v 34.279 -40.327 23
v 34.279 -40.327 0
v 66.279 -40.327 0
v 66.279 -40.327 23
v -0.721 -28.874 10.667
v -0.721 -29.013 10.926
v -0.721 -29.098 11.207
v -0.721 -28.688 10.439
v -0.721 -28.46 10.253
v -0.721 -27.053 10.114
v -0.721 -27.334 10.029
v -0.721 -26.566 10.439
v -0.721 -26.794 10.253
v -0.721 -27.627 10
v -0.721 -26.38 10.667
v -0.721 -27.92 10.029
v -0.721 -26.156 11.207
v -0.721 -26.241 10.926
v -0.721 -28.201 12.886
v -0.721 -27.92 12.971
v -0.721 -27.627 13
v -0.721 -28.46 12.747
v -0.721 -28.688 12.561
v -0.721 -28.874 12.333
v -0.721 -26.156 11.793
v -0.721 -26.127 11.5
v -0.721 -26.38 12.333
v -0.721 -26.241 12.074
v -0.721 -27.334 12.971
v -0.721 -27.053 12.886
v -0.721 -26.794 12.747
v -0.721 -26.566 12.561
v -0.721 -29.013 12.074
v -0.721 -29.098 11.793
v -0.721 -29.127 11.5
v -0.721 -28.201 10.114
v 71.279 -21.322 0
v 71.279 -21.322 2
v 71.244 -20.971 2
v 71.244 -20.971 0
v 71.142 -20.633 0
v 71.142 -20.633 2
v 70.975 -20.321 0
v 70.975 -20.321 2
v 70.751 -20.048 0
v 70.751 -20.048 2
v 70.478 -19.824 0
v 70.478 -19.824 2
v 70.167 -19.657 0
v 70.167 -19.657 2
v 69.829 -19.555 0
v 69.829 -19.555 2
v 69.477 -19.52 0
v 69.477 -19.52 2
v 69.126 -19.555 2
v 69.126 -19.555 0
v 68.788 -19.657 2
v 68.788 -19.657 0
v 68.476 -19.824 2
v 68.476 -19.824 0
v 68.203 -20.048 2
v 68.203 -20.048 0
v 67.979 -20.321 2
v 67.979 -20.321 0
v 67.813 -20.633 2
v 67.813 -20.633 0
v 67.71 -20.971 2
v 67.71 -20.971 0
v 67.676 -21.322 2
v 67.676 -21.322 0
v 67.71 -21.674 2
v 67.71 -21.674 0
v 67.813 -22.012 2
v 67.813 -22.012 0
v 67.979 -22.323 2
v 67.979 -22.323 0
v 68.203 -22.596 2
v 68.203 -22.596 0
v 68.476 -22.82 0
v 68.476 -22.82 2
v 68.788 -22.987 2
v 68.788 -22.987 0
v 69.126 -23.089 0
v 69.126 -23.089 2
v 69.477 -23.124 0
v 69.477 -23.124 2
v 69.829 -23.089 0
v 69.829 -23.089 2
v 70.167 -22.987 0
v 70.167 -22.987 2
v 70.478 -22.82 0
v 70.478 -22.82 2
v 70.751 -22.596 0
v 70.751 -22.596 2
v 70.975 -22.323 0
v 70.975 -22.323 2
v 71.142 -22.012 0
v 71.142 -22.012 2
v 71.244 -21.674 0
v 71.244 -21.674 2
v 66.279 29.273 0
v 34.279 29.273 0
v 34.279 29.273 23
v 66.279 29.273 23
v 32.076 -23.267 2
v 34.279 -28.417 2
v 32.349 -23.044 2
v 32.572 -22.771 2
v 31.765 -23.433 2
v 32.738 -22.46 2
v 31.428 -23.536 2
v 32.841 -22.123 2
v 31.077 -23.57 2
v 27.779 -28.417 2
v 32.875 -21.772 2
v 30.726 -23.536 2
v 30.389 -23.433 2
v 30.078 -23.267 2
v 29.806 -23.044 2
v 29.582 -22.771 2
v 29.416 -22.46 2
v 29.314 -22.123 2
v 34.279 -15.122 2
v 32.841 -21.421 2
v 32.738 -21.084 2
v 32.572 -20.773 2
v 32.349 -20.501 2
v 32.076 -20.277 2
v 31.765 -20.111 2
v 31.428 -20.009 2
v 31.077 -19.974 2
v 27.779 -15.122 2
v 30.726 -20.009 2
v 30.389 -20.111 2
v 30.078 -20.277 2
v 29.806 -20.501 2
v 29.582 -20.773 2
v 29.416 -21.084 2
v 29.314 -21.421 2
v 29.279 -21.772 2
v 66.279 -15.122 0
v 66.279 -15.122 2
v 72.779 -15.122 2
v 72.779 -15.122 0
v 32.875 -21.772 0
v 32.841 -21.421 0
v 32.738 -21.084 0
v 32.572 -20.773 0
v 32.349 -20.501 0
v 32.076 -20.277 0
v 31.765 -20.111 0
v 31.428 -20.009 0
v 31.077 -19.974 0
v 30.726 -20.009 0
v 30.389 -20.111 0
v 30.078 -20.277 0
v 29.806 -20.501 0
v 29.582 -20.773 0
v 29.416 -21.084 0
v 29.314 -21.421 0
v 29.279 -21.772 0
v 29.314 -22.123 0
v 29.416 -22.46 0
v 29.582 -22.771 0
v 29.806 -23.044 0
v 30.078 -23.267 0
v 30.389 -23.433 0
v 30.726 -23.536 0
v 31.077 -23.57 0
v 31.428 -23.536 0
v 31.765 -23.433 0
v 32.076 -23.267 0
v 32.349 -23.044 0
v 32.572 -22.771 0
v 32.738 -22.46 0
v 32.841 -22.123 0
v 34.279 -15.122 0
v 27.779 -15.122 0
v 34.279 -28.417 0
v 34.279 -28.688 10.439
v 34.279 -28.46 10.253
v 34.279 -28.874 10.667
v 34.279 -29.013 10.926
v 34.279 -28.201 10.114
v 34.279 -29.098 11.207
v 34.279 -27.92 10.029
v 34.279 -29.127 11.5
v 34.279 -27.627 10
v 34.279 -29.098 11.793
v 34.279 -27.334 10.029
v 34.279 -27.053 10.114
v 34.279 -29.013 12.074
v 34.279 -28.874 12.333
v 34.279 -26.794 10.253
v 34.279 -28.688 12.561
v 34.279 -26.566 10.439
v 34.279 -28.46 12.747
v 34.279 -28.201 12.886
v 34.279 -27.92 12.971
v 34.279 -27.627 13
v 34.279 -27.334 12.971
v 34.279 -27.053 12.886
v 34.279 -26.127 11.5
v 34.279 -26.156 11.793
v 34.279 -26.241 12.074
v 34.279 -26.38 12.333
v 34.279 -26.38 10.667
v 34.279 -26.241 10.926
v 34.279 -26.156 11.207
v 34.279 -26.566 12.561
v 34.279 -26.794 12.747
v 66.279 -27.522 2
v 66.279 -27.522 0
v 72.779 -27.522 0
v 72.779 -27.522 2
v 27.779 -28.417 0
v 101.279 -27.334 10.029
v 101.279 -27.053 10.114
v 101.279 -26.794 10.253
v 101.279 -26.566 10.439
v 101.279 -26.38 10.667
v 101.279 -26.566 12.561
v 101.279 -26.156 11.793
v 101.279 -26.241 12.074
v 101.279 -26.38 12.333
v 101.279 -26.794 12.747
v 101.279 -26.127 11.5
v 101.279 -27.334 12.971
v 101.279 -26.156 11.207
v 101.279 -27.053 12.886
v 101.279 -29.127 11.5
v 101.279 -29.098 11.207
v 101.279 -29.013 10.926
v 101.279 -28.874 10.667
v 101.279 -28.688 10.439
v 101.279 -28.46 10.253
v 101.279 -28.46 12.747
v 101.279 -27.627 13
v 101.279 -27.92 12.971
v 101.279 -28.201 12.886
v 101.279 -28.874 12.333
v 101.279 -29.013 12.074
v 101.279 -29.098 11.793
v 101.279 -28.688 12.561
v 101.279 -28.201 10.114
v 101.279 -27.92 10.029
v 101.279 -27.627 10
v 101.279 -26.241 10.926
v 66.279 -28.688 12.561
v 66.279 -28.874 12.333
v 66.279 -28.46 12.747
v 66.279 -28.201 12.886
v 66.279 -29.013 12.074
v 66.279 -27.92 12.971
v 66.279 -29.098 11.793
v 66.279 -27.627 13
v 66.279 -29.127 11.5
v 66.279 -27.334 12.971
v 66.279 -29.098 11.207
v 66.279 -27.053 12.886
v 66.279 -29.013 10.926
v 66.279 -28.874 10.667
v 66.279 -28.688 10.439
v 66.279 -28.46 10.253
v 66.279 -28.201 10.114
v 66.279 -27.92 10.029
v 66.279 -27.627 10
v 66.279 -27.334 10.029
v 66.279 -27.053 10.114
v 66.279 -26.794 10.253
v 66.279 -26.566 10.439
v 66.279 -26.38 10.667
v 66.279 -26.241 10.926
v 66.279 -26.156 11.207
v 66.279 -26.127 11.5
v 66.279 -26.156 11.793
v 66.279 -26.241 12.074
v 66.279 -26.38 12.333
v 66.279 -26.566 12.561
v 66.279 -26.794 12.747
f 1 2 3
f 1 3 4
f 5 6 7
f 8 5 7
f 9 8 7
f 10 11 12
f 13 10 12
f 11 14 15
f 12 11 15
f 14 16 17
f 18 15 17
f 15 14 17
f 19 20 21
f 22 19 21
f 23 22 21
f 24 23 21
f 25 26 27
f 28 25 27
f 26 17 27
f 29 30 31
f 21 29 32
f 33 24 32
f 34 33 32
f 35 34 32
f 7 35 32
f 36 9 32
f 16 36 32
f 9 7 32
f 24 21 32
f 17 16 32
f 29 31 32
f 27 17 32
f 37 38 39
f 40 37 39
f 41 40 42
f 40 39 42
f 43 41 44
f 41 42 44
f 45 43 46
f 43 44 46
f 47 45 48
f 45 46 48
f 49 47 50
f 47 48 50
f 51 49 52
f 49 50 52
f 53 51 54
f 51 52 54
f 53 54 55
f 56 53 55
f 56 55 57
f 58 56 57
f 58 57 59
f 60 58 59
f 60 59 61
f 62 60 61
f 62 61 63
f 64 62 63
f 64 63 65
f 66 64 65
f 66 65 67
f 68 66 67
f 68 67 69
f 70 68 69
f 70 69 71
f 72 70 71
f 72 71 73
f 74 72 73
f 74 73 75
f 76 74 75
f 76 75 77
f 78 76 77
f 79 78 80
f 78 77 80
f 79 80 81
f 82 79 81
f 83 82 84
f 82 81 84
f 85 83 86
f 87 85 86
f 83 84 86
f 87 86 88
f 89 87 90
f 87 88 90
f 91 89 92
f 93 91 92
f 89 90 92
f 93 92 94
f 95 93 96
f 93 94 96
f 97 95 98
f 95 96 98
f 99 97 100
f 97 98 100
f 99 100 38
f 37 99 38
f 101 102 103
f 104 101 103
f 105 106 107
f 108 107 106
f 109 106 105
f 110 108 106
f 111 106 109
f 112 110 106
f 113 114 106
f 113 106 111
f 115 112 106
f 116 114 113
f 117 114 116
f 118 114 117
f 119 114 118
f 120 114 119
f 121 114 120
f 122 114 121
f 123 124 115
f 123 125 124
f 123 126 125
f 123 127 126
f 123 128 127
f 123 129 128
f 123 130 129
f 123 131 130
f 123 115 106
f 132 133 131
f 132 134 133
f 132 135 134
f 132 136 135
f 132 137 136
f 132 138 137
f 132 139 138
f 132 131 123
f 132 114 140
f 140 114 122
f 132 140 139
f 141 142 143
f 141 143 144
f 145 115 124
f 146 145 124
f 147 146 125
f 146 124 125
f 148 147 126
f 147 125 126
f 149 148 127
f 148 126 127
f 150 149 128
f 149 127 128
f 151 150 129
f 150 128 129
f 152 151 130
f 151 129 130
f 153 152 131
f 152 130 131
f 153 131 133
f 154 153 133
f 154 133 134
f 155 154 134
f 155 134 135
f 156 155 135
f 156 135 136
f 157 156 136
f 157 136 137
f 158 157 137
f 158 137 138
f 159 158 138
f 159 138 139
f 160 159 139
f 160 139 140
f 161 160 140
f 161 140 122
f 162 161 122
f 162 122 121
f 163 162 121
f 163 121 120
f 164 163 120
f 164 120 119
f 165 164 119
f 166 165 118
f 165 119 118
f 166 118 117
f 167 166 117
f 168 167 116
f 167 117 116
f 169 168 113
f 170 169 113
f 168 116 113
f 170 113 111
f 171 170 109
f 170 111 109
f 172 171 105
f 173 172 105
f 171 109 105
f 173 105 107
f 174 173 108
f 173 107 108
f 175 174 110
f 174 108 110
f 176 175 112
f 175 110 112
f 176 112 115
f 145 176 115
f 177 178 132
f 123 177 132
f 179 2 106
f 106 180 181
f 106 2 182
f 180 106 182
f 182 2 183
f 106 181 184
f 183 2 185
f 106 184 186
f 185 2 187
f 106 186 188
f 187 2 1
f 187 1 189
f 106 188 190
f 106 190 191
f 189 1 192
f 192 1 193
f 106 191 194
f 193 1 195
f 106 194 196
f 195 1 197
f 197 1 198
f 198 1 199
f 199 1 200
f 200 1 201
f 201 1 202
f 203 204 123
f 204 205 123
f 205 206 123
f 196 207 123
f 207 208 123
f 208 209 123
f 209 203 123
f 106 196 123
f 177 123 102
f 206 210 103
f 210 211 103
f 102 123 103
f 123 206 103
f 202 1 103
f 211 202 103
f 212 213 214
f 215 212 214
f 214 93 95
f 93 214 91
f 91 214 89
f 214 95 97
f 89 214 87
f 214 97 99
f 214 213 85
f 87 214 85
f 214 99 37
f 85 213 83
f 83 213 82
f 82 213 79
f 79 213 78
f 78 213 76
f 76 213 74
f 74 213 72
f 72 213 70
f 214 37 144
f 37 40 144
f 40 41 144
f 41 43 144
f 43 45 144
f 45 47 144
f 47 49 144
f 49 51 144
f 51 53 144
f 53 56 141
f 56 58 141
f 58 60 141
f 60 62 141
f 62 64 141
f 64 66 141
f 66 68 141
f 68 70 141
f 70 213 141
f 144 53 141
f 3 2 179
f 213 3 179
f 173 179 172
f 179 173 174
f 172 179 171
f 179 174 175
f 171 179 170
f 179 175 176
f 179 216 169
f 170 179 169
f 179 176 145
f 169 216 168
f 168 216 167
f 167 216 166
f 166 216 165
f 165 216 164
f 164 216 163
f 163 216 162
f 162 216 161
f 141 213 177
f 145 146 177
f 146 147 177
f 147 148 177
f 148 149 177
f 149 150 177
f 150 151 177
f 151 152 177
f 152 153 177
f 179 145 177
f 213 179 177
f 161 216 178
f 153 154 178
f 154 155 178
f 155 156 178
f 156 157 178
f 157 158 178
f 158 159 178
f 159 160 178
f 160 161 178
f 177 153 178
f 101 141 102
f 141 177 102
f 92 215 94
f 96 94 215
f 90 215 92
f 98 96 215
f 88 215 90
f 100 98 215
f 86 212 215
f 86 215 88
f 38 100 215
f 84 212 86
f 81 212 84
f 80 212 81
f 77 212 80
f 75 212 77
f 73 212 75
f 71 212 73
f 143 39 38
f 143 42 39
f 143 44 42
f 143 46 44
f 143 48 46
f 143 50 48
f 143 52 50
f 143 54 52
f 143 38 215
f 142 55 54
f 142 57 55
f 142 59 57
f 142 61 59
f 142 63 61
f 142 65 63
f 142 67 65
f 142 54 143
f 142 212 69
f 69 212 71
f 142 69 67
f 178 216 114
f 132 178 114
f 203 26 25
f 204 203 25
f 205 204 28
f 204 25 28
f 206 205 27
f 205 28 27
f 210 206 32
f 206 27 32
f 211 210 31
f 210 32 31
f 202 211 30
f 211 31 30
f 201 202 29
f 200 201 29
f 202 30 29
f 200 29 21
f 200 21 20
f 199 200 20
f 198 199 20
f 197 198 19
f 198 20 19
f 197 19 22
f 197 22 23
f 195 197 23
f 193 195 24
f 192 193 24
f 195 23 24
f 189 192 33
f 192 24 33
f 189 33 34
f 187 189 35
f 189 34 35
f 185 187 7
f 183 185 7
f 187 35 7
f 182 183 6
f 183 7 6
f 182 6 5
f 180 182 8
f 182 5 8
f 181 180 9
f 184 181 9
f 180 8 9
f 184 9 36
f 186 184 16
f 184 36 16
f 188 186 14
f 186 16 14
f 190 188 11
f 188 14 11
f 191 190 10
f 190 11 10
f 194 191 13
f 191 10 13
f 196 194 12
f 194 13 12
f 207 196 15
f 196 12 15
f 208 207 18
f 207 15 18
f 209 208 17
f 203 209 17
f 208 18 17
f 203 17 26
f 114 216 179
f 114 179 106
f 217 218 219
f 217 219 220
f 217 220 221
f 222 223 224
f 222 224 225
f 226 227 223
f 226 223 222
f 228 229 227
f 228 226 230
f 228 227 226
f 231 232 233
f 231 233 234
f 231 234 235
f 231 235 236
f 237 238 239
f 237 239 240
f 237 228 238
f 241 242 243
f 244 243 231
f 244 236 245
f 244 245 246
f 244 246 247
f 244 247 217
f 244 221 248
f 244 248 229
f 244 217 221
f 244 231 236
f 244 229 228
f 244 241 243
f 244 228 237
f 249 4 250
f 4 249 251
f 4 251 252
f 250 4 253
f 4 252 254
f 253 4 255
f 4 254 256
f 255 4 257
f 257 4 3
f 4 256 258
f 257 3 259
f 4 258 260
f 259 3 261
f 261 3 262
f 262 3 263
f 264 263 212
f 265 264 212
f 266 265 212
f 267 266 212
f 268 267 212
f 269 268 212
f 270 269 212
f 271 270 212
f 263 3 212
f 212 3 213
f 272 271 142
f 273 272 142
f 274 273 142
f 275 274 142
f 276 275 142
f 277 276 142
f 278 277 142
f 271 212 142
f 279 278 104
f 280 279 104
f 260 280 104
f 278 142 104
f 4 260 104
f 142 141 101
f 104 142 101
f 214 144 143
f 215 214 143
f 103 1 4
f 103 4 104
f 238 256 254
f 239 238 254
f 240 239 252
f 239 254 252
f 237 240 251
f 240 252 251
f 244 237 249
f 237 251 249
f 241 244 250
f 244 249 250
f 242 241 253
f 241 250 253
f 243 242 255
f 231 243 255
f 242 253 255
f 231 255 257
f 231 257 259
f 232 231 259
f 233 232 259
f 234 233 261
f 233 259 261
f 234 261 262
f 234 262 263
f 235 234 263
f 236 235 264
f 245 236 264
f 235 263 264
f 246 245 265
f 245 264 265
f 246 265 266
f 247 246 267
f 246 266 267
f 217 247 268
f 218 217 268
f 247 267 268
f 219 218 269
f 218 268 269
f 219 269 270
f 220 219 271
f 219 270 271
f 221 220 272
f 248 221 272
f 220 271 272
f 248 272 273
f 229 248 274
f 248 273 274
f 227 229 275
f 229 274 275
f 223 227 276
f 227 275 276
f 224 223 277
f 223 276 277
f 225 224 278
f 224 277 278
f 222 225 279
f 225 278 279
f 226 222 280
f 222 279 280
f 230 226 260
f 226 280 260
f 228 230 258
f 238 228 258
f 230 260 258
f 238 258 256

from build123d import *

# Parameters (mm, degrees)
SKETCH_1_W            = 32
SKETCH_1_H            = 69.6
EXTRUDE_1_DEPTH       = 23
SKETCH_2_R            = 1.5
EXTRUDE_2_DEPTH       = 35
SKETCH_3_W            = 2
SKETCH_3_H            = 3.6
EXTRUDE_3_DEPTH       = 4.5
SKETCH_5_W            = 16
SKETCH_5_H            = 23
CUT_EXTRUDE_1_DEPTH   = 71.5
SKETCH_6_W            = 4.5
SKETCH_6_H            = 3.6
CUT_EXTRUDE_2_DEPTH   = 1
SKETCH_7_W            = 2
SKETCH_7_H            = 4.4
EXTRUDE_4_DEPTH       = 6.5
SKETCH_9_W            = 1
SKETCH_9_H            = 1.8
CUT_EXTRUDE_3_DEPTH   = 4.5
MIRROR_4_OUTLINE_W    = 4.5
MIRROR_4_OUTLINE_H    = 1.8
MIRROR_4_DEPTH        = 1
MIRROR_4_2_OUTLINE_W  = 6.5
MIRROR_4_2_OUTLINE_H  = 4.4
MIRROR_4_2_DEPTH      = 2
SKETCH_10_W           = 1.5
SKETCH_10_H           = 2
EXTRUDE_5_DEPTH       = 4.5
MIRROR_START          = 34.279062003
MIRROR_25_OUTLINE_W   = 69.6
MIRROR_25_OUTLINE_H   = 23
MIRROR_25_DEPTH       = 16
MIRROR_START_2        = -0.720937997
MIRROR_25_2_OUTLINE_R = 1.5
MIRROR_25_2_DEPTH     = 35
MIRROR_START_3        = 27.779062003
MIRROR_25_3_OUTLINE_W = 4.4
MIRROR_25_3_OUTLINE_H = 2
MIRROR_25_3_DEPTH     = 6.5
MIRROR_25_4_OUTLINE_W = 4.5
MIRROR_25_4_OUTLINE_H = 2
MIRROR_25_4_DEPTH     = 1.5
SKETCH_12_W           = 2
SKETCH_12_H           = 4.395113111
EXTRUDE_6_DEPTH       = 7.5
SKETCH_15_W           = 2
SKETCH_15_H           = 3.6
EXTRUDE_7_DEPTH       = 6
SKETCH_14_R           = 1.801767182
CUT_EXTRUDE_4_DEPTH   = 6
SKETCH_17_W           = 2
SKETCH_17_H           = 4.5
EXTRUDE_8_DEPTH       = 6
SKETCH_16_R           = 1.798109405
CUT_EXTRUDE_5_DEPTH   = 6


# Read off the part's stored shape, not the designer's step: ﾐﾗｰ4, ﾐﾗｰ25
with BuildPart() as part:
    # ｽｹｯﾁ1 → ﾎﾞｽ - 押し出し1 (new body)
    with BuildSketch(Plane.XY):
        with Locations((50.279062003, -5.527058824)):
            Rectangle(SKETCH_1_W, SKETCH_1_H)
    extrude(amount=EXTRUDE_1_DEPTH)

    # ｽｹｯﾁ2 → ﾎﾞｽ - 押し出し2 (add)
    with BuildSketch(Plane(origin=(66.279062003, 0, 0), x_dir=(0, 0, -1), z_dir=(1, 0, 0))):
        with Locations(Location((-11.5, -27.627058824, 0), (0, 0, 180))):
            Circle(SKETCH_2_R)
    extrude(amount=EXTRUDE_2_DEPTH)

    # ｽｹｯﾁ3 → ﾎﾞｽ - 押し出し3 (add)
    with BuildSketch(Plane(origin=(66.279062003, 0, 0), x_dir=(0, 0, -1), z_dir=(1, 0, 0))):
        with Locations((-1, -21.322089651)):
            Rectangle(SKETCH_3_W, SKETCH_3_H)
    extrude(amount=EXTRUDE_3_DEPTH)

    # ｽｹｯﾁ5 → ｶｯﾄ - 押し出し1 (cut)
    with BuildSketch(Plane(origin=(0, 29.272941176, 0), x_dir=(1, 0, 0), z_dir=(0, 1, 0))):
        with Locations((42.279062003, -11.5)):
            Rectangle(SKETCH_5_W, SKETCH_5_H)
    extrude(amount=-CUT_EXTRUDE_1_DEPTH, mode=Mode.SUBTRACT)

    # ｽｹｯﾁ6 → ｶｯﾄ - 押し出し2 (cut)
    with BuildSketch(Plane.XY.offset(2)):
        with Locations((68.529062003, -21.322089651)):
            Rectangle(SKETCH_6_W, SKETCH_6_H)
    extrude(amount=-CUT_EXTRUDE_2_DEPTH, mode=Mode.SUBTRACT)

    # ｽｹｯﾁ7 → ﾎﾞｽ - 押し出し4 (add)
    with BuildSketch(Plane(origin=(66.279062003, 0, 0), x_dir=(0, 0, -1), z_dir=(1, 0, 0))):
        with Locations((-1, -17.322089651)):
            Rectangle(SKETCH_7_W, SKETCH_7_H)
    extrude(amount=EXTRUDE_4_DEPTH)

    # ｽｹｯﾁ9 → ｶｯﾄ - 押し出し3 (cut)
    with BuildSketch(Plane(origin=(70.779062003, 0, 0), x_dir=(0, 0, -1), z_dir=(1, 0, 0))):
        with Locations((-0.5, -22.222089651)):
            Rectangle(SKETCH_9_W, SKETCH_9_H)
    extrude(amount=-CUT_EXTRUDE_3_DEPTH, mode=Mode.SUBTRACT)

    # ﾐﾗｰ4 outline → ﾐﾗｰ4 (cut)
    with BuildSketch(Plane.XY):
        with Locations((68.529062003, -20.422089651)):
            Rectangle(MIRROR_4_OUTLINE_W, MIRROR_4_OUTLINE_H)
    extrude(amount=MIRROR_4_DEPTH, mode=Mode.SUBTRACT)

    # Mirror 4 2 outline → Mirror 4 2 (add)
    with BuildSketch(Plane.XY):
        with Locations((69.529062003, -25.322089651)):
            Rectangle(MIRROR_4_2_OUTLINE_W, MIRROR_4_2_OUTLINE_H)
    extrude(amount=MIRROR_4_2_DEPTH)

    # ｽｹｯﾁ10 → ﾎﾞｽ - 押し出し5 (add)
    with BuildSketch(Plane.XZ.offset(19.522089651)):
        with Locations((72.029062003, 1)):
            Rectangle(SKETCH_10_W, SKETCH_10_H)
    extrude(amount=EXTRUDE_5_DEPTH)

    # ﾐﾗｰ25 outline → ﾐﾗｰ25 (add)
    with BuildSketch(Plane.YZ.offset(MIRROR_START)):
        with Locations((-5.527058824, 11.5)):
            Rectangle(MIRROR_25_OUTLINE_W, MIRROR_25_OUTLINE_H)
    extrude(amount=MIRROR_25_DEPTH)

    # Mirror 25 2 outline → Mirror 25 2 (add)
    with BuildSketch(Plane.YZ.offset(MIRROR_START_2)):
        with Locations((-27.627058824, 11.5)):
            Circle(MIRROR_25_2_OUTLINE_R)
    extrude(amount=MIRROR_25_2_DEPTH)

    # Mirror 25 3 outline → Mirror 25 3 (add)
    with BuildSketch(Plane.YZ.offset(MIRROR_START_3)):
        with Locations((-17.322089651, 1)):
            Rectangle(MIRROR_25_3_OUTLINE_W, MIRROR_25_3_OUTLINE_H)
    extrude(amount=MIRROR_25_3_DEPTH)

    # Mirror 25 4 outline → Mirror 25 4 (add)
    with BuildSketch(Plane.YZ.offset(MIRROR_START_3)):
        with Locations((-21.772089651, 1)):
            Rectangle(MIRROR_25_4_OUTLINE_W, MIRROR_25_4_OUTLINE_H)
    extrude(amount=MIRROR_25_4_DEPTH)

    # ｽｹｯﾁ12 → ﾎﾞｽ - 押し出し6 (add)
    with BuildSketch(Plane.ZY.offset(-27.779062003)):
        with Locations((1, -26.219646207)):
            Rectangle(SKETCH_12_W, SKETCH_12_H)
    extrude(amount=-EXTRUDE_6_DEPTH)

    # ｽｹｯﾁ15 → ﾎﾞｽ - 押し出し7 (add)
    with BuildSketch(Plane(origin=(66.279062003, 0, 0), x_dir=(0, 0, -1), z_dir=(1, 0, 0))):
        with Locations((-1, -21.322089651)):
            Rectangle(SKETCH_15_W, SKETCH_15_H)
    extrude(amount=EXTRUDE_7_DEPTH)

    # ｽｹｯﾁ14 → ｶｯﾄ - 押し出し4 (cut)
    with BuildSketch(Plane.XY.offset(2)):
        with Locations((69.477294821, -21.322089651)):
            Circle(SKETCH_14_R)
    extrude(amount=-CUT_EXTRUDE_4_DEPTH, mode=Mode.SUBTRACT)

    # ｽｹｯﾁ17 → ﾎﾞｽ - 押し出し8 (add)
    with BuildSketch(Plane.ZY.offset(-34.279062003)):
        with Locations((1, -21.772089651)):
            Rectangle(SKETCH_17_W, SKETCH_17_H)
    extrude(amount=EXTRUDE_8_DEPTH)

    # ｽｹｯﾁ16 → ｶｯﾄ - 押し出し5 (cut)
    with BuildSketch(Plane.XY.offset(2)):
        with Locations((31.077171408, -21.772089651)):
            Circle(SKETCH_16_R)
    extrude(amount=-CUT_EXTRUDE_5_DEPTH, mode=Mode.SUBTRACT)


solid = part.part
